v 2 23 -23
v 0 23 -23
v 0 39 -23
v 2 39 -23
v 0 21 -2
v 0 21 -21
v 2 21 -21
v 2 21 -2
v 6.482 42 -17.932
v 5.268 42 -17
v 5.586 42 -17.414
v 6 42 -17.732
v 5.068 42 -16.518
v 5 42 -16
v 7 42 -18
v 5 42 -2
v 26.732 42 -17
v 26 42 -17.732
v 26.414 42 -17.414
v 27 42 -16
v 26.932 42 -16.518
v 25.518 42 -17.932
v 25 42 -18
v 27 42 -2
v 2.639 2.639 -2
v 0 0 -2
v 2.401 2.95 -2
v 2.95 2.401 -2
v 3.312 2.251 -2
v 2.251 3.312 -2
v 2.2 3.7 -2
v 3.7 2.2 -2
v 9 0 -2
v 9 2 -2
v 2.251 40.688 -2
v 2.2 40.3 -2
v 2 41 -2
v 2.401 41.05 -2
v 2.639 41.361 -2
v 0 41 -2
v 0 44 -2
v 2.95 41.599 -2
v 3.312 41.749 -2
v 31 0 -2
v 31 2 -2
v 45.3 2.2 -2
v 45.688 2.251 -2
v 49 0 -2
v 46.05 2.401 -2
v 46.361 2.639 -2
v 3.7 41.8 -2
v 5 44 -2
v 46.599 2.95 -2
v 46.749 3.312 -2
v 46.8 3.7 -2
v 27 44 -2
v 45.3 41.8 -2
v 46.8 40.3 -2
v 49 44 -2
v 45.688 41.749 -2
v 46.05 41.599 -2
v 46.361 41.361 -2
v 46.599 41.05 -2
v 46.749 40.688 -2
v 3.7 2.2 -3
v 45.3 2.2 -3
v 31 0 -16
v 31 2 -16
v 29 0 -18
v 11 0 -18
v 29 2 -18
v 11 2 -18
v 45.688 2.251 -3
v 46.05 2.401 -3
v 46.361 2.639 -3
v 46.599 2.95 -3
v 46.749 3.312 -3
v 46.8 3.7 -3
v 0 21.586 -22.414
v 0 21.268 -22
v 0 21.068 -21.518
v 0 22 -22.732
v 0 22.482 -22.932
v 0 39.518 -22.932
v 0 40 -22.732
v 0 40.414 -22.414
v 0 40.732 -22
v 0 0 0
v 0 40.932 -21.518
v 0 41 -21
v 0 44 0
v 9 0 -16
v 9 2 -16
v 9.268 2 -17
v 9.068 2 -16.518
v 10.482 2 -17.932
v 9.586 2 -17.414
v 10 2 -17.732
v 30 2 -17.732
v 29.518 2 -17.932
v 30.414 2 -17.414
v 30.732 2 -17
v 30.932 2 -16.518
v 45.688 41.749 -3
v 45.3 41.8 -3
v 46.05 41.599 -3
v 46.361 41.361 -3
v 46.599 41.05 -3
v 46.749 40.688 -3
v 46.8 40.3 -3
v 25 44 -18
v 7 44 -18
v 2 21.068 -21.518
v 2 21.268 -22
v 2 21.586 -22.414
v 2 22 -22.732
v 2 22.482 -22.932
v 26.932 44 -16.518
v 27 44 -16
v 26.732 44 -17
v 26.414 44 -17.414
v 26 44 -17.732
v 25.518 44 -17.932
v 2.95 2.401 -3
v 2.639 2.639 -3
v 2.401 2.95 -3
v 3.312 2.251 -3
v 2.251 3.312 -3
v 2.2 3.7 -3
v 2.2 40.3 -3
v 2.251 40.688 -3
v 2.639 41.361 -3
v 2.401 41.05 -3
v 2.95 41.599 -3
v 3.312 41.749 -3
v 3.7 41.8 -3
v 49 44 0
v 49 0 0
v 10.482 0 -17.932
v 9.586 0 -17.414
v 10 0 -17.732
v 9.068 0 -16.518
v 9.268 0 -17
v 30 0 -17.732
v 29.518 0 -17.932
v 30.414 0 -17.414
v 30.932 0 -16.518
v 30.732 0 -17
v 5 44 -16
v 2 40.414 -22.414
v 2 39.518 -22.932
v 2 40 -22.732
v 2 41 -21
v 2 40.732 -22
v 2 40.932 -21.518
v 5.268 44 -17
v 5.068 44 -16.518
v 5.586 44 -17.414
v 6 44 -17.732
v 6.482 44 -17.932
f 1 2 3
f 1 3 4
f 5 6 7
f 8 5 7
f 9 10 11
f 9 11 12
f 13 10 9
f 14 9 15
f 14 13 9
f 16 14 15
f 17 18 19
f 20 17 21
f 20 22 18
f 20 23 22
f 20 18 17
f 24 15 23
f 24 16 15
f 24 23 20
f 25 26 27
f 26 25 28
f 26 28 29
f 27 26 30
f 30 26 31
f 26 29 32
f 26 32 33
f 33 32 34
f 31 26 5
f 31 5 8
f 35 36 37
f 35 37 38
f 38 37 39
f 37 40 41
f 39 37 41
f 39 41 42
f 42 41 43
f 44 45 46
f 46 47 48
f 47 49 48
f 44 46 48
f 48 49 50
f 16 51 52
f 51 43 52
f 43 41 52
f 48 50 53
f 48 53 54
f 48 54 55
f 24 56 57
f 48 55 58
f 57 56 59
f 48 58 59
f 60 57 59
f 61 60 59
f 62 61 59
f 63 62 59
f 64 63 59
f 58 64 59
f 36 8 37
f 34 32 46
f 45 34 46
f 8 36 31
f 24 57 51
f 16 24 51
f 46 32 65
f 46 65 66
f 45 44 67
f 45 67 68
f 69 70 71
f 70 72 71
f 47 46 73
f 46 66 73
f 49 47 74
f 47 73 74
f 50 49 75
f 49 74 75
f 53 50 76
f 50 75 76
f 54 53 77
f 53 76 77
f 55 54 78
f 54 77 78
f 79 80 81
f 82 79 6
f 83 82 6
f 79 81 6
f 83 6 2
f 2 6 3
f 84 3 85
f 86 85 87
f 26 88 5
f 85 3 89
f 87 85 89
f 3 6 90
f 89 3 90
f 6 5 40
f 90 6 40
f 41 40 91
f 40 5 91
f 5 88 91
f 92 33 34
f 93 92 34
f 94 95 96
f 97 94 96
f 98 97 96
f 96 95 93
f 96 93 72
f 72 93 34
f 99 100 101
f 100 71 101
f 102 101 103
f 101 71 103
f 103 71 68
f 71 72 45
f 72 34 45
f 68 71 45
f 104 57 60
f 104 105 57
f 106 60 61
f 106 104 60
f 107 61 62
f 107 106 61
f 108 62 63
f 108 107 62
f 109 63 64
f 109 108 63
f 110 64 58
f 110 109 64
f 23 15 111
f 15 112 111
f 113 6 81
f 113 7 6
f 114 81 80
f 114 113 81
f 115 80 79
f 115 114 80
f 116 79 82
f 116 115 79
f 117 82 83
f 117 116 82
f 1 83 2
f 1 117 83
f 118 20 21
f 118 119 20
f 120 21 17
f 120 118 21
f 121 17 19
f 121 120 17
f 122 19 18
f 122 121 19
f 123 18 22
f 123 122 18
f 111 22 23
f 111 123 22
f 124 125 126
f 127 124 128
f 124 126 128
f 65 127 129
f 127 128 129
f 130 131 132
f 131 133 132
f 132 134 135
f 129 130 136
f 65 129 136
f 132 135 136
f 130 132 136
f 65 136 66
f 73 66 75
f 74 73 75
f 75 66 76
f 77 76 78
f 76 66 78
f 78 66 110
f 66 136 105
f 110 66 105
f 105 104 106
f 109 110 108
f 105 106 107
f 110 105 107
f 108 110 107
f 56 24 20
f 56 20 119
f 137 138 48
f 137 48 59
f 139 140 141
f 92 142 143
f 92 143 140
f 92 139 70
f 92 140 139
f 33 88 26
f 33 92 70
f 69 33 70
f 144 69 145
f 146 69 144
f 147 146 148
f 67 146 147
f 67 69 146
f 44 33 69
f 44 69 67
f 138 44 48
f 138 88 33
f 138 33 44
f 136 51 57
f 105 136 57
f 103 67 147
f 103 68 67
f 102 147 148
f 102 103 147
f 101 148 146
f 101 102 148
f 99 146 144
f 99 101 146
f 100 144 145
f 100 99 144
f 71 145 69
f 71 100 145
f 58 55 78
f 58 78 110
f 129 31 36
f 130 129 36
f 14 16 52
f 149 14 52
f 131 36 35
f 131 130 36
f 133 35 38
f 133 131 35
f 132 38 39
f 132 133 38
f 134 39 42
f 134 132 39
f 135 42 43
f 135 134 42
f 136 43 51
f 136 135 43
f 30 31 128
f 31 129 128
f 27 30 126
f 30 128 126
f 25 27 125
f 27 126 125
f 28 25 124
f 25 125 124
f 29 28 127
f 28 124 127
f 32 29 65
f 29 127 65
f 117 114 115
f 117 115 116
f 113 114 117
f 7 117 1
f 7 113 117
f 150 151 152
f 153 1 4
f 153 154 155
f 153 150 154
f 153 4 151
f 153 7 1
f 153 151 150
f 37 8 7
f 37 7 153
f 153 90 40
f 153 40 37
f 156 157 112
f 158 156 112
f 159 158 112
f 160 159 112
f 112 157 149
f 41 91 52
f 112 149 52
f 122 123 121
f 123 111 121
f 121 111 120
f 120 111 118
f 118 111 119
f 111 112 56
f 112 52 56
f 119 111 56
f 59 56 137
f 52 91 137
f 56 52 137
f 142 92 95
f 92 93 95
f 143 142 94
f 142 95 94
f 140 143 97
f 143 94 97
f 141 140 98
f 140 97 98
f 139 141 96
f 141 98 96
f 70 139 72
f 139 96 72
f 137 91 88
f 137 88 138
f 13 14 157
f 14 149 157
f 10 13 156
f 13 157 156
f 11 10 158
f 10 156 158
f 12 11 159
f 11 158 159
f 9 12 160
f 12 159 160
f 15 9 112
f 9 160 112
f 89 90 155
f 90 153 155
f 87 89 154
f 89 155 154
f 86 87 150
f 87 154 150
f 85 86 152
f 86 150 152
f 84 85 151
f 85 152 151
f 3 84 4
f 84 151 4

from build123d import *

# Parameters (mm, degrees)
F0_W     = 44.6
F0_H     = 39.6
F1_DEPTH = 2
F0_W_2   = 22
F0_H_2   = 2
F2_DEPTH = 18
F0_W_3   = 2
F0_H_3   = 20
F3_DEPTH = 23
F4_DEPTH = 3
F5_R     = 1.5
F6_R     = 2


with BuildPart() as f1:
    # F0 (on Top) → F1 (new body)
    with BuildSketch(Plane.XY):
        Polygon((31, 0), (49, 0), (49, 44), (27, 44), (27, 42), (5, 42), (5, 44), (0, 44), (0, 41.8), (0, 41), (2, 41), (2, 21), (0, 21), (0, 0), (9, 0), (9, 2), (31, 2), align=None)
        with Locations((24.5, 22)):
            Rectangle(F0_W, F0_H, mode=Mode.SUBTRACT)
    extrude(amount=-F1_DEPTH)

    # F0 (on Top) → F2 (join)
    with BuildSketch(Plane.XY):
        with Locations((16, 43)):
            Rectangle(F0_W_2, F0_H_2)
        with Locations((20, 1)):
            Rectangle(F0_W_2, F0_H_2)
    extrude(amount=-F2_DEPTH)

    # F0 (on Top) → F3 (join)
    with BuildSketch(Plane.XY):
        with Locations((1, 31)):
            Rectangle(F0_W_3, F0_H_3)
    extrude(amount=-F3_DEPTH)

    # F0 (on Top) → F4 (join)
    with BuildSketch(Plane.XY):
        with Locations((24.5, 22)):
            Rectangle(F0_W, F0_H)
    extrude(amount=-F4_DEPTH)

    # F5
    f5_edges = [f1.edges().sort_by_distance(p)[0] for p in [
        (2.2, 2.2, -2.5),
        (2.2, 41.8, -2.5),
        (46.8, 2.2, -2.5),
        (46.8, 41.8, -2.5),
    ]]
    fillet(f5_edges, radius=F5_R)

    # F6
    f6_edges = [f1.edges().sort_by_distance(p)[0] for p in [
        (5, 43, -18),
        (27, 43, -18),
        (1, 41, -23),
        (1, 21, -23),
        (31, 1, -18),
        (9, 1, -18),
    ]]
    fillet(f6_edges, radius=F6_R)


solid = f1.part
